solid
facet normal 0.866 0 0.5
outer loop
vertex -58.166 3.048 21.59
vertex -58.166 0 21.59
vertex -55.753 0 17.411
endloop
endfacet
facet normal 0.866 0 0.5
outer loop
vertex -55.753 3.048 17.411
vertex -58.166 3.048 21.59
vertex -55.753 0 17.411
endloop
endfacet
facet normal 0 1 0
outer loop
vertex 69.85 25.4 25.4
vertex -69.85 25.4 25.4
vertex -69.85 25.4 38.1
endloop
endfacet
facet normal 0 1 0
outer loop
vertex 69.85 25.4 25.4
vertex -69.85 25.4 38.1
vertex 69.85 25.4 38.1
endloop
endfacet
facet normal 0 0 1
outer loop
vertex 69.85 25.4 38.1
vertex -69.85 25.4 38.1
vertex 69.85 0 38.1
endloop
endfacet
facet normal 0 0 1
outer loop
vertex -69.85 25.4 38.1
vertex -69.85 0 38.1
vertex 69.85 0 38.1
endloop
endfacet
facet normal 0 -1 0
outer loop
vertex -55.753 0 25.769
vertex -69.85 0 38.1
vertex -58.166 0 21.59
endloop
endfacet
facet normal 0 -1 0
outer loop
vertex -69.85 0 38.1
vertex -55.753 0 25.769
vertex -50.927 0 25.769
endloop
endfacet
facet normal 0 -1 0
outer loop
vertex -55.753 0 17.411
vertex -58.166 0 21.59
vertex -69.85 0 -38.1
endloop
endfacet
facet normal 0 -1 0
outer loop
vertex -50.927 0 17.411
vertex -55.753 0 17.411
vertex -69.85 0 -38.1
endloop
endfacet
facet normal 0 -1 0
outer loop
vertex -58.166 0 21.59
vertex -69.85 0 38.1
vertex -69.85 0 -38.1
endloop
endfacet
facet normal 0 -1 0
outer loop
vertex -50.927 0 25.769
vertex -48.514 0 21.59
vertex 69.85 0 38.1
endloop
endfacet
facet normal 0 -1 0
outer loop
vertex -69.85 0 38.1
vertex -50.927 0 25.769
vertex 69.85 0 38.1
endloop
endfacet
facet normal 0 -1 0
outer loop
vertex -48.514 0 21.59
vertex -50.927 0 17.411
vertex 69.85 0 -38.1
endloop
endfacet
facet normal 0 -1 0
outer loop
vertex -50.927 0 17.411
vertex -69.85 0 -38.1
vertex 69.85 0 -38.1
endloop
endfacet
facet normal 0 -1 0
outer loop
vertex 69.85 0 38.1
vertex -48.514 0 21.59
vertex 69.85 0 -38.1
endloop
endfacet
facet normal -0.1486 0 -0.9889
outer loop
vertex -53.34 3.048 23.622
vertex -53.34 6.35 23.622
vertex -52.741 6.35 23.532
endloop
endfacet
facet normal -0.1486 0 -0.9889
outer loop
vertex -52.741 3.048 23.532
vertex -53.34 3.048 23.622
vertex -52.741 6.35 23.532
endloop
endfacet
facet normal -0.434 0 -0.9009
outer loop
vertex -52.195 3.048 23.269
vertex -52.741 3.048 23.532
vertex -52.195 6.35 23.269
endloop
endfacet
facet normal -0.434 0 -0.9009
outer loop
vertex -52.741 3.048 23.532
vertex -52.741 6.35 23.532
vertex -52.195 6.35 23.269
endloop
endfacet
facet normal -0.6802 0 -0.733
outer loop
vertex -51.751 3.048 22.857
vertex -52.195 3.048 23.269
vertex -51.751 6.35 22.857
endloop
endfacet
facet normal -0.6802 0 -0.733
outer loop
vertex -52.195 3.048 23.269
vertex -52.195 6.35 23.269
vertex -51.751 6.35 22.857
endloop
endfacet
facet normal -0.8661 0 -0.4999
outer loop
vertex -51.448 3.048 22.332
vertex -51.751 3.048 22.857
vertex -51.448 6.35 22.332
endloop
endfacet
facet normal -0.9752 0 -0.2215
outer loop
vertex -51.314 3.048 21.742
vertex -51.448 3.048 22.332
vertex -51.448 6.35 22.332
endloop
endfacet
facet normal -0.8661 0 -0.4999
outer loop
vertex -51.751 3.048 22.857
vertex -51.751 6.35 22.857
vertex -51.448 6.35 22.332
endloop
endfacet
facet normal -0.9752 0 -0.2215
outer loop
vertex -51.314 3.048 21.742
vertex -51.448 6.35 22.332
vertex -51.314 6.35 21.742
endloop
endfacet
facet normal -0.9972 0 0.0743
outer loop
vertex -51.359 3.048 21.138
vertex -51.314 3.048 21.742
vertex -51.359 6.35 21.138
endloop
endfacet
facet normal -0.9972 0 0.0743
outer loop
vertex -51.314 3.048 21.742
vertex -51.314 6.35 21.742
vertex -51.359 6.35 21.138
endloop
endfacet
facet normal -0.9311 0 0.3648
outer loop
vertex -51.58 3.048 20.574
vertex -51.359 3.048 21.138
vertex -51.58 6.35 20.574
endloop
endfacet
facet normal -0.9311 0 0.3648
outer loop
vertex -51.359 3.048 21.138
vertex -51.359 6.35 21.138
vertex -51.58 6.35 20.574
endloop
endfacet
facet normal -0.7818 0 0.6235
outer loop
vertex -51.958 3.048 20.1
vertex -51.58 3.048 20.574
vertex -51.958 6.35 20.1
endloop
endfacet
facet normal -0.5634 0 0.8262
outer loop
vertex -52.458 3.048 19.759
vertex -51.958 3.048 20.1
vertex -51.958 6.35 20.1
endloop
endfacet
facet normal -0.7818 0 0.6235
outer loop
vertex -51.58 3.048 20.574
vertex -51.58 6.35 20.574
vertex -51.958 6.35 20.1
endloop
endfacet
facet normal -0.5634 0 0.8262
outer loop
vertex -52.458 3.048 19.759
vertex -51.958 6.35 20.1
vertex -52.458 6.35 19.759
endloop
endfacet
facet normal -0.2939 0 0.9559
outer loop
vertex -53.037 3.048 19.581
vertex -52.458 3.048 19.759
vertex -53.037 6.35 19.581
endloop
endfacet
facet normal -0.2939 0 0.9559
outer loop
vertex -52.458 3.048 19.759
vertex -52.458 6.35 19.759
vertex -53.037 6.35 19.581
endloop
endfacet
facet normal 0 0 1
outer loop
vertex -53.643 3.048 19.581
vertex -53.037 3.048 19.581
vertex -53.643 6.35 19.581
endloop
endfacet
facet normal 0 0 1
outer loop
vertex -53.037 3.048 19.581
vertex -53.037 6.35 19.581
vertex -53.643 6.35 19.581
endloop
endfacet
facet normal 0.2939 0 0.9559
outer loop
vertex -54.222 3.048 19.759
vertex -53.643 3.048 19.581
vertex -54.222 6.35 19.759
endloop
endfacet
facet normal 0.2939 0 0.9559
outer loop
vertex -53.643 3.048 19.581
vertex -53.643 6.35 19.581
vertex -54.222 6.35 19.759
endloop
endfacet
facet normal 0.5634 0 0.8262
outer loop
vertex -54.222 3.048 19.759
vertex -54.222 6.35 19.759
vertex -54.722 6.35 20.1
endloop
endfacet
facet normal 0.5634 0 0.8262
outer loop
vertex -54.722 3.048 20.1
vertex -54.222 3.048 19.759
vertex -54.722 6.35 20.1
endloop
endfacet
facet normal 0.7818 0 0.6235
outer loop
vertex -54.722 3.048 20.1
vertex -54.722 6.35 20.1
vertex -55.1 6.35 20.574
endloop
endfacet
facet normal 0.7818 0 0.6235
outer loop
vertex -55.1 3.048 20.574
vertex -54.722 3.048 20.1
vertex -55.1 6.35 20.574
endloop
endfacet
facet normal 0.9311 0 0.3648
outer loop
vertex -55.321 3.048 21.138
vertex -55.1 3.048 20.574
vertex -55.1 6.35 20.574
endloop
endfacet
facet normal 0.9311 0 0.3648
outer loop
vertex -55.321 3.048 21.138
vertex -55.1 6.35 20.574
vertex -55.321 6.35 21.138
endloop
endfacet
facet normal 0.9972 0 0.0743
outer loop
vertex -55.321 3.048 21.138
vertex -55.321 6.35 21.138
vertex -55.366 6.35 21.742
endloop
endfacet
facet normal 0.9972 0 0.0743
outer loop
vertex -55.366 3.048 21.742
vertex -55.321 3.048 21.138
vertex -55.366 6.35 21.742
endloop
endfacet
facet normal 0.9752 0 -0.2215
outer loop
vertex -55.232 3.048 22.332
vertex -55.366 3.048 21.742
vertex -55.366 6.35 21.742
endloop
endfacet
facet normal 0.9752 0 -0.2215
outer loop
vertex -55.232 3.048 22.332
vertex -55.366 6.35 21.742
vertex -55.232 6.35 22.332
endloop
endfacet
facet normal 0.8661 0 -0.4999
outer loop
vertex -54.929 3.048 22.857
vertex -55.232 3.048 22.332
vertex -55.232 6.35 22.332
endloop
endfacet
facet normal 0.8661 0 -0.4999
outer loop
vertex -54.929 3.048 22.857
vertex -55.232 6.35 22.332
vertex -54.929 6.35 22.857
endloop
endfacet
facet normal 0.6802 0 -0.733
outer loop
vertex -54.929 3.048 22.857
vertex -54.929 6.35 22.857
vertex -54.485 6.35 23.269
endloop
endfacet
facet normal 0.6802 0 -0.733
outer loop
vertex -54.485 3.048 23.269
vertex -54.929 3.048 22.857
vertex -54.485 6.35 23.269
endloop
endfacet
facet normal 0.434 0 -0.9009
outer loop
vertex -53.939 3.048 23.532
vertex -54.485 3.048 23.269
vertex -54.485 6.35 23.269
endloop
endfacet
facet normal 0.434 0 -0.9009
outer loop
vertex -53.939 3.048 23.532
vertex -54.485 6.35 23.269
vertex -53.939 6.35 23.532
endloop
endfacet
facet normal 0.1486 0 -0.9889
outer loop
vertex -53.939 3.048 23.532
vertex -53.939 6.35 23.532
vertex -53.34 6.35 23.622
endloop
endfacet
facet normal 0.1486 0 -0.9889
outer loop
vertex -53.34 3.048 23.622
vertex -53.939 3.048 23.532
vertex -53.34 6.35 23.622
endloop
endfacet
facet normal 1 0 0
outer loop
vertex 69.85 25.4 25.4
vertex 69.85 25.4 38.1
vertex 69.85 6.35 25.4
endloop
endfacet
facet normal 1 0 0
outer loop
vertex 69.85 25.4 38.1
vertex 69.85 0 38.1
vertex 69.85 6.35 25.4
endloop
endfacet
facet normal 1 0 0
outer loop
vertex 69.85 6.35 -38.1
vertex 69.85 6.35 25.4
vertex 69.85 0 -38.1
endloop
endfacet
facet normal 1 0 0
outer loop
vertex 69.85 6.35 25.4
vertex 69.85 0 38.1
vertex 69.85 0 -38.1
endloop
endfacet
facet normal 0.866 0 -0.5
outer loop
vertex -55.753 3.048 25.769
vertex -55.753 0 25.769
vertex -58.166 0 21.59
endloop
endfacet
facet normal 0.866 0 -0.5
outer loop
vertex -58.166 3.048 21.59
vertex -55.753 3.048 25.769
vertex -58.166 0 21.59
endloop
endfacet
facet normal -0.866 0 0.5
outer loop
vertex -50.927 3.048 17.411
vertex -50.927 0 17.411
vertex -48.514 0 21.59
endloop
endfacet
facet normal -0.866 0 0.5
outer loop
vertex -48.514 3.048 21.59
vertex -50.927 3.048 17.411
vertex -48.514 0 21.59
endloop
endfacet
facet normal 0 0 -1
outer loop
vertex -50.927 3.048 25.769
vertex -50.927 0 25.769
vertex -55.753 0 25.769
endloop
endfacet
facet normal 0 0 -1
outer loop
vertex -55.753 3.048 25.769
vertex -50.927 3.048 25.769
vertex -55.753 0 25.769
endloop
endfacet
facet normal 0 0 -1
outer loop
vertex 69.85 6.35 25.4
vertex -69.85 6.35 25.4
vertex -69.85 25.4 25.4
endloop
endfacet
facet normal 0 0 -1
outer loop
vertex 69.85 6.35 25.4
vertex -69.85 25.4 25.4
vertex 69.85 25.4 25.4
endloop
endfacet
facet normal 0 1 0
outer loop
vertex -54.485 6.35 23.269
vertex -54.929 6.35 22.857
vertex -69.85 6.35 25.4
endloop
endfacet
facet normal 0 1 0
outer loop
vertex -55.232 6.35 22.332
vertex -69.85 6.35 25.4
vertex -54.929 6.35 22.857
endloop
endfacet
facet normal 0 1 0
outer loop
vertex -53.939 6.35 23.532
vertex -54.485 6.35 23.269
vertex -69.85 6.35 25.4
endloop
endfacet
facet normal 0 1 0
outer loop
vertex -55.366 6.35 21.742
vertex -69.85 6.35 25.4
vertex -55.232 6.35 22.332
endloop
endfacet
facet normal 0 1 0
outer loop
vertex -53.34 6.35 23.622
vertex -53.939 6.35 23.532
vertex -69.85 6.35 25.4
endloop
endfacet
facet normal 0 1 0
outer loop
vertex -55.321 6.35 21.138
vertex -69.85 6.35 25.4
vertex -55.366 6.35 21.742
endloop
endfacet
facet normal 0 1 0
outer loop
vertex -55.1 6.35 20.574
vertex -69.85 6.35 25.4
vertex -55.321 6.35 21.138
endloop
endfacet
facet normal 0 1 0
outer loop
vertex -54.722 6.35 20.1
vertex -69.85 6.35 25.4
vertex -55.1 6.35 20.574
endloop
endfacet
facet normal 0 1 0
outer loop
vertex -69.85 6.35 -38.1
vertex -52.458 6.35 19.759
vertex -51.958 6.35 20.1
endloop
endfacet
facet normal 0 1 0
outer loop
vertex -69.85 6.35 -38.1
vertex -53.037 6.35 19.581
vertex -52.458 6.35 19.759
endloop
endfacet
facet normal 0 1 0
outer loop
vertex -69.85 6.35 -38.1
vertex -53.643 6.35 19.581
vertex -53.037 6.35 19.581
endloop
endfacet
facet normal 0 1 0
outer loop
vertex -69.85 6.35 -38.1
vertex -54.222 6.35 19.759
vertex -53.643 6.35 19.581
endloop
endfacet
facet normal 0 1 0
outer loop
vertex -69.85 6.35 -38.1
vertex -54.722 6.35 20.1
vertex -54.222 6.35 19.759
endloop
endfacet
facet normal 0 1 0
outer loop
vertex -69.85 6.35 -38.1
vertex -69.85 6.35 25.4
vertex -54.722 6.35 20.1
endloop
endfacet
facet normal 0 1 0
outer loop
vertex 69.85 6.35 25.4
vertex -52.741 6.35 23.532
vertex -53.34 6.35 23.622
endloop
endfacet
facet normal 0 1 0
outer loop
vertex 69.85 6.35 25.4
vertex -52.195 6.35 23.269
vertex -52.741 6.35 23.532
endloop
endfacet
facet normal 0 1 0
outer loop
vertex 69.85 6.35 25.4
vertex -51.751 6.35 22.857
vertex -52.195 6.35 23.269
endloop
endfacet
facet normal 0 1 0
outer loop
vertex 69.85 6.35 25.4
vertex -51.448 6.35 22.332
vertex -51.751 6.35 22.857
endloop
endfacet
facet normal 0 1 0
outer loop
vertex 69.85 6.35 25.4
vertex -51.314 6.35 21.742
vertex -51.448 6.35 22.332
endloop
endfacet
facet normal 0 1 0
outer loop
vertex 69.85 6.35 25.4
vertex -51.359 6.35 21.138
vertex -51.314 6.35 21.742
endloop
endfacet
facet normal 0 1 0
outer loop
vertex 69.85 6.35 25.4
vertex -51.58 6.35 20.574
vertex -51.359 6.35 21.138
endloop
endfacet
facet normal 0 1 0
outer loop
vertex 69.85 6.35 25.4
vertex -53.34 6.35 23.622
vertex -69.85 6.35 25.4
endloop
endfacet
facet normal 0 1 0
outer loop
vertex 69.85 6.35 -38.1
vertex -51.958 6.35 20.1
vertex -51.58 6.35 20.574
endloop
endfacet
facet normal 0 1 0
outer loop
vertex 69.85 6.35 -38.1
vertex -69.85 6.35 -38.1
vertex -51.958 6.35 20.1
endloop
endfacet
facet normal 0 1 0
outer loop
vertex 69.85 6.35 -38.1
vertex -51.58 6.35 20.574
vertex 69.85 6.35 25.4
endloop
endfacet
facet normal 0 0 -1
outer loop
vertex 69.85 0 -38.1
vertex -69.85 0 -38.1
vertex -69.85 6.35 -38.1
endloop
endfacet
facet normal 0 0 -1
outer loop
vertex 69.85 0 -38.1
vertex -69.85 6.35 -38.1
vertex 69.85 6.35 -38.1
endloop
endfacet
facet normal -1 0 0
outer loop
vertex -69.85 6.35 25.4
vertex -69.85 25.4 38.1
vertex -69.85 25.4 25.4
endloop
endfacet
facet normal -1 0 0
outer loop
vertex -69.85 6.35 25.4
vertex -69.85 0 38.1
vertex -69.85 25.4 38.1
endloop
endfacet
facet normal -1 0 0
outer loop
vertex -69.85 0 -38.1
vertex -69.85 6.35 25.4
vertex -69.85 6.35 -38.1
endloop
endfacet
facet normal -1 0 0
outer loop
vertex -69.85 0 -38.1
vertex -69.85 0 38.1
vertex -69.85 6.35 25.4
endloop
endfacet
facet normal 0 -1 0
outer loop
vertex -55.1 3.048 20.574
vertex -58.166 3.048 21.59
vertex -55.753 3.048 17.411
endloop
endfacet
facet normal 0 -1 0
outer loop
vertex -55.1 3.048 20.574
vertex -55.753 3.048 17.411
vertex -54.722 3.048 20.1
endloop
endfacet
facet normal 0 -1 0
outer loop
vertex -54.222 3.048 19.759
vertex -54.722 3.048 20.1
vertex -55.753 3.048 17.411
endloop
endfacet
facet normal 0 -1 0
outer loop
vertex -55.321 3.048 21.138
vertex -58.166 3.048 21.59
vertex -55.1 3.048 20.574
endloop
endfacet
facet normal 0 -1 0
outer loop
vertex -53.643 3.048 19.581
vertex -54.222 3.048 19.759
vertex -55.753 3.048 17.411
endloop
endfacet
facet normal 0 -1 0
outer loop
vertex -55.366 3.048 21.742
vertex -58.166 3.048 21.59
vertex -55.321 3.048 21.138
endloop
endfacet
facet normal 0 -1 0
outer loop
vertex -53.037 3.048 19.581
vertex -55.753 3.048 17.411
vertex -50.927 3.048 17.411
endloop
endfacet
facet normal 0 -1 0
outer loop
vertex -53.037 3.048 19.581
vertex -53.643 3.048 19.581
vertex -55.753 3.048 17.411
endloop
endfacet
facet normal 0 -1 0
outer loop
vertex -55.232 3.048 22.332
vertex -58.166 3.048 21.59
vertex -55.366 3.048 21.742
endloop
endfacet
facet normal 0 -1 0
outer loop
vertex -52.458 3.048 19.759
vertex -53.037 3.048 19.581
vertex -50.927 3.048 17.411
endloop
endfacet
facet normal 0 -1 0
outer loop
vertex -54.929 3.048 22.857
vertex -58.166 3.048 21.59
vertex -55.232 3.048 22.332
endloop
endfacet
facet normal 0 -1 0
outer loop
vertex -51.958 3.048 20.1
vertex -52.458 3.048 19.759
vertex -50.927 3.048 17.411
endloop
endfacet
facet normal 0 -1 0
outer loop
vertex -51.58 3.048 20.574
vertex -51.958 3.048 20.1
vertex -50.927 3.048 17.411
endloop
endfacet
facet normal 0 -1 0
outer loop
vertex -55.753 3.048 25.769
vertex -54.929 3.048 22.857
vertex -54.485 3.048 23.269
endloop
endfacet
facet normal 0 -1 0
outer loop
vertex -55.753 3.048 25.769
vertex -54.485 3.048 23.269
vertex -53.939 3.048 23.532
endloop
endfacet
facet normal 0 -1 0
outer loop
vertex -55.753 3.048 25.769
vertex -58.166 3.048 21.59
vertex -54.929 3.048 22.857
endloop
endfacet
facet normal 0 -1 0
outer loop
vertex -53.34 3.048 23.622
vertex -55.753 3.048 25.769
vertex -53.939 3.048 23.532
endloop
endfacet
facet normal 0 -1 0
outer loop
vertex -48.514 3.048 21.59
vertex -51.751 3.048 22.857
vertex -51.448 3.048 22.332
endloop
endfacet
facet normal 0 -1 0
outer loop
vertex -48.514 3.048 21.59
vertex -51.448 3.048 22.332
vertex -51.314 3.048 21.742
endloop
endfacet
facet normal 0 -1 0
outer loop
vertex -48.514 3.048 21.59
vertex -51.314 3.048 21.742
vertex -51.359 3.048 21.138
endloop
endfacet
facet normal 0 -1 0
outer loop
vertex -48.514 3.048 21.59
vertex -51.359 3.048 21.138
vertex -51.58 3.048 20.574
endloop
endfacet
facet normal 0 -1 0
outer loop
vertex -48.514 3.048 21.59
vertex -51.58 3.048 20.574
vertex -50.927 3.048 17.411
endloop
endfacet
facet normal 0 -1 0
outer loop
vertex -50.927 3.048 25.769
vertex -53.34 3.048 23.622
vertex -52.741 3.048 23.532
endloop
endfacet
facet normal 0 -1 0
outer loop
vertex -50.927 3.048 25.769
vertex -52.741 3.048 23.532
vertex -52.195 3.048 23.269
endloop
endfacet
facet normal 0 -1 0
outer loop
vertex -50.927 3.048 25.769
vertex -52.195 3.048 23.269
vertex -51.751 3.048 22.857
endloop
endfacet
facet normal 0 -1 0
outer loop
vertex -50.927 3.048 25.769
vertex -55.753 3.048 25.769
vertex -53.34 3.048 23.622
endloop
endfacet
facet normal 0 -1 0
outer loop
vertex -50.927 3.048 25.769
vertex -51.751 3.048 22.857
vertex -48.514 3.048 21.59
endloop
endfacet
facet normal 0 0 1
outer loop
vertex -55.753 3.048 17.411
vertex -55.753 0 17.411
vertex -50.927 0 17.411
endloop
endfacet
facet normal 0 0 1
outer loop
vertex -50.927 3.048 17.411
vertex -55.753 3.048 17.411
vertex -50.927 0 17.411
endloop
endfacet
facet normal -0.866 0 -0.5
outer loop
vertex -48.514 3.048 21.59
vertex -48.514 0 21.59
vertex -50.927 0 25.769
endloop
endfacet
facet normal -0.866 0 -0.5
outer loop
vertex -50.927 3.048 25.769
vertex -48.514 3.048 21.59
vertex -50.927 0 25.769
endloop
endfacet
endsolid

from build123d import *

# Parameters (mm, degrees)
SKETCH1_W           = 139.7
SKETCH1_H           = 76.2
BOSS_EXTRUDE1_DEPTH = 6.35
SKETCH2_W           = 139.7
SKETCH2_H           = 12.7
BOSS_EXTRUDE2_DEPTH = 19.05
SKETCH3_R           = 2.032
CUT_EXTRUDE1_DEPTH  = 82.814026915
CUT_EXTRUDE2_DEPTH  = 3.048


with BuildPart() as part:
    # Sketch1 → Boss-Extrude1 (new body)
    with BuildSketch(Plane(origin=(0, 0, 0), x_dir=(1, 0, 0), z_dir=(0, 1, 0))):
        Rectangle(SKETCH1_W, SKETCH1_H)
    extrude(amount=BOSS_EXTRUDE1_DEPTH)

    # Sketch2 → Boss-Extrude2 (add)
    with BuildSketch(Plane(origin=(0, 6.35, 0), x_dir=(1, 0, 0), z_dir=(0, 1, 0))):
        with Locations((0, -31.75)):
            Rectangle(SKETCH2_W, SKETCH2_H)
    extrude(amount=BOSS_EXTRUDE2_DEPTH)

    # Sketch3 → Cut-Extrude1 (cut, through all)
    with BuildSketch(Plane(origin=(0, 6.35, 0), x_dir=(1, 0, 0), z_dir=(0, 1, 0))):
        with Locations(Location((-53.34, -21.59, 0), (0, 0, 270))):
            Circle(SKETCH3_R)
    extrude(amount=-CUT_EXTRUDE1_DEPTH, mode=Mode.SUBTRACT)

    # Sketch4 → Cut-Extrude2 (cut)
    with BuildSketch(Plane.XZ):
        Polygon((-50.927, 25.769438599), (-55.753, 25.769438599), (-58.166, 21.59), (-55.753, 17.410561401), (-50.927, 17.410561401), (-48.514, 21.59), align=None)
    extrude(amount=-CUT_EXTRUDE2_DEPTH, mode=Mode.SUBTRACT)


solid = part.part
